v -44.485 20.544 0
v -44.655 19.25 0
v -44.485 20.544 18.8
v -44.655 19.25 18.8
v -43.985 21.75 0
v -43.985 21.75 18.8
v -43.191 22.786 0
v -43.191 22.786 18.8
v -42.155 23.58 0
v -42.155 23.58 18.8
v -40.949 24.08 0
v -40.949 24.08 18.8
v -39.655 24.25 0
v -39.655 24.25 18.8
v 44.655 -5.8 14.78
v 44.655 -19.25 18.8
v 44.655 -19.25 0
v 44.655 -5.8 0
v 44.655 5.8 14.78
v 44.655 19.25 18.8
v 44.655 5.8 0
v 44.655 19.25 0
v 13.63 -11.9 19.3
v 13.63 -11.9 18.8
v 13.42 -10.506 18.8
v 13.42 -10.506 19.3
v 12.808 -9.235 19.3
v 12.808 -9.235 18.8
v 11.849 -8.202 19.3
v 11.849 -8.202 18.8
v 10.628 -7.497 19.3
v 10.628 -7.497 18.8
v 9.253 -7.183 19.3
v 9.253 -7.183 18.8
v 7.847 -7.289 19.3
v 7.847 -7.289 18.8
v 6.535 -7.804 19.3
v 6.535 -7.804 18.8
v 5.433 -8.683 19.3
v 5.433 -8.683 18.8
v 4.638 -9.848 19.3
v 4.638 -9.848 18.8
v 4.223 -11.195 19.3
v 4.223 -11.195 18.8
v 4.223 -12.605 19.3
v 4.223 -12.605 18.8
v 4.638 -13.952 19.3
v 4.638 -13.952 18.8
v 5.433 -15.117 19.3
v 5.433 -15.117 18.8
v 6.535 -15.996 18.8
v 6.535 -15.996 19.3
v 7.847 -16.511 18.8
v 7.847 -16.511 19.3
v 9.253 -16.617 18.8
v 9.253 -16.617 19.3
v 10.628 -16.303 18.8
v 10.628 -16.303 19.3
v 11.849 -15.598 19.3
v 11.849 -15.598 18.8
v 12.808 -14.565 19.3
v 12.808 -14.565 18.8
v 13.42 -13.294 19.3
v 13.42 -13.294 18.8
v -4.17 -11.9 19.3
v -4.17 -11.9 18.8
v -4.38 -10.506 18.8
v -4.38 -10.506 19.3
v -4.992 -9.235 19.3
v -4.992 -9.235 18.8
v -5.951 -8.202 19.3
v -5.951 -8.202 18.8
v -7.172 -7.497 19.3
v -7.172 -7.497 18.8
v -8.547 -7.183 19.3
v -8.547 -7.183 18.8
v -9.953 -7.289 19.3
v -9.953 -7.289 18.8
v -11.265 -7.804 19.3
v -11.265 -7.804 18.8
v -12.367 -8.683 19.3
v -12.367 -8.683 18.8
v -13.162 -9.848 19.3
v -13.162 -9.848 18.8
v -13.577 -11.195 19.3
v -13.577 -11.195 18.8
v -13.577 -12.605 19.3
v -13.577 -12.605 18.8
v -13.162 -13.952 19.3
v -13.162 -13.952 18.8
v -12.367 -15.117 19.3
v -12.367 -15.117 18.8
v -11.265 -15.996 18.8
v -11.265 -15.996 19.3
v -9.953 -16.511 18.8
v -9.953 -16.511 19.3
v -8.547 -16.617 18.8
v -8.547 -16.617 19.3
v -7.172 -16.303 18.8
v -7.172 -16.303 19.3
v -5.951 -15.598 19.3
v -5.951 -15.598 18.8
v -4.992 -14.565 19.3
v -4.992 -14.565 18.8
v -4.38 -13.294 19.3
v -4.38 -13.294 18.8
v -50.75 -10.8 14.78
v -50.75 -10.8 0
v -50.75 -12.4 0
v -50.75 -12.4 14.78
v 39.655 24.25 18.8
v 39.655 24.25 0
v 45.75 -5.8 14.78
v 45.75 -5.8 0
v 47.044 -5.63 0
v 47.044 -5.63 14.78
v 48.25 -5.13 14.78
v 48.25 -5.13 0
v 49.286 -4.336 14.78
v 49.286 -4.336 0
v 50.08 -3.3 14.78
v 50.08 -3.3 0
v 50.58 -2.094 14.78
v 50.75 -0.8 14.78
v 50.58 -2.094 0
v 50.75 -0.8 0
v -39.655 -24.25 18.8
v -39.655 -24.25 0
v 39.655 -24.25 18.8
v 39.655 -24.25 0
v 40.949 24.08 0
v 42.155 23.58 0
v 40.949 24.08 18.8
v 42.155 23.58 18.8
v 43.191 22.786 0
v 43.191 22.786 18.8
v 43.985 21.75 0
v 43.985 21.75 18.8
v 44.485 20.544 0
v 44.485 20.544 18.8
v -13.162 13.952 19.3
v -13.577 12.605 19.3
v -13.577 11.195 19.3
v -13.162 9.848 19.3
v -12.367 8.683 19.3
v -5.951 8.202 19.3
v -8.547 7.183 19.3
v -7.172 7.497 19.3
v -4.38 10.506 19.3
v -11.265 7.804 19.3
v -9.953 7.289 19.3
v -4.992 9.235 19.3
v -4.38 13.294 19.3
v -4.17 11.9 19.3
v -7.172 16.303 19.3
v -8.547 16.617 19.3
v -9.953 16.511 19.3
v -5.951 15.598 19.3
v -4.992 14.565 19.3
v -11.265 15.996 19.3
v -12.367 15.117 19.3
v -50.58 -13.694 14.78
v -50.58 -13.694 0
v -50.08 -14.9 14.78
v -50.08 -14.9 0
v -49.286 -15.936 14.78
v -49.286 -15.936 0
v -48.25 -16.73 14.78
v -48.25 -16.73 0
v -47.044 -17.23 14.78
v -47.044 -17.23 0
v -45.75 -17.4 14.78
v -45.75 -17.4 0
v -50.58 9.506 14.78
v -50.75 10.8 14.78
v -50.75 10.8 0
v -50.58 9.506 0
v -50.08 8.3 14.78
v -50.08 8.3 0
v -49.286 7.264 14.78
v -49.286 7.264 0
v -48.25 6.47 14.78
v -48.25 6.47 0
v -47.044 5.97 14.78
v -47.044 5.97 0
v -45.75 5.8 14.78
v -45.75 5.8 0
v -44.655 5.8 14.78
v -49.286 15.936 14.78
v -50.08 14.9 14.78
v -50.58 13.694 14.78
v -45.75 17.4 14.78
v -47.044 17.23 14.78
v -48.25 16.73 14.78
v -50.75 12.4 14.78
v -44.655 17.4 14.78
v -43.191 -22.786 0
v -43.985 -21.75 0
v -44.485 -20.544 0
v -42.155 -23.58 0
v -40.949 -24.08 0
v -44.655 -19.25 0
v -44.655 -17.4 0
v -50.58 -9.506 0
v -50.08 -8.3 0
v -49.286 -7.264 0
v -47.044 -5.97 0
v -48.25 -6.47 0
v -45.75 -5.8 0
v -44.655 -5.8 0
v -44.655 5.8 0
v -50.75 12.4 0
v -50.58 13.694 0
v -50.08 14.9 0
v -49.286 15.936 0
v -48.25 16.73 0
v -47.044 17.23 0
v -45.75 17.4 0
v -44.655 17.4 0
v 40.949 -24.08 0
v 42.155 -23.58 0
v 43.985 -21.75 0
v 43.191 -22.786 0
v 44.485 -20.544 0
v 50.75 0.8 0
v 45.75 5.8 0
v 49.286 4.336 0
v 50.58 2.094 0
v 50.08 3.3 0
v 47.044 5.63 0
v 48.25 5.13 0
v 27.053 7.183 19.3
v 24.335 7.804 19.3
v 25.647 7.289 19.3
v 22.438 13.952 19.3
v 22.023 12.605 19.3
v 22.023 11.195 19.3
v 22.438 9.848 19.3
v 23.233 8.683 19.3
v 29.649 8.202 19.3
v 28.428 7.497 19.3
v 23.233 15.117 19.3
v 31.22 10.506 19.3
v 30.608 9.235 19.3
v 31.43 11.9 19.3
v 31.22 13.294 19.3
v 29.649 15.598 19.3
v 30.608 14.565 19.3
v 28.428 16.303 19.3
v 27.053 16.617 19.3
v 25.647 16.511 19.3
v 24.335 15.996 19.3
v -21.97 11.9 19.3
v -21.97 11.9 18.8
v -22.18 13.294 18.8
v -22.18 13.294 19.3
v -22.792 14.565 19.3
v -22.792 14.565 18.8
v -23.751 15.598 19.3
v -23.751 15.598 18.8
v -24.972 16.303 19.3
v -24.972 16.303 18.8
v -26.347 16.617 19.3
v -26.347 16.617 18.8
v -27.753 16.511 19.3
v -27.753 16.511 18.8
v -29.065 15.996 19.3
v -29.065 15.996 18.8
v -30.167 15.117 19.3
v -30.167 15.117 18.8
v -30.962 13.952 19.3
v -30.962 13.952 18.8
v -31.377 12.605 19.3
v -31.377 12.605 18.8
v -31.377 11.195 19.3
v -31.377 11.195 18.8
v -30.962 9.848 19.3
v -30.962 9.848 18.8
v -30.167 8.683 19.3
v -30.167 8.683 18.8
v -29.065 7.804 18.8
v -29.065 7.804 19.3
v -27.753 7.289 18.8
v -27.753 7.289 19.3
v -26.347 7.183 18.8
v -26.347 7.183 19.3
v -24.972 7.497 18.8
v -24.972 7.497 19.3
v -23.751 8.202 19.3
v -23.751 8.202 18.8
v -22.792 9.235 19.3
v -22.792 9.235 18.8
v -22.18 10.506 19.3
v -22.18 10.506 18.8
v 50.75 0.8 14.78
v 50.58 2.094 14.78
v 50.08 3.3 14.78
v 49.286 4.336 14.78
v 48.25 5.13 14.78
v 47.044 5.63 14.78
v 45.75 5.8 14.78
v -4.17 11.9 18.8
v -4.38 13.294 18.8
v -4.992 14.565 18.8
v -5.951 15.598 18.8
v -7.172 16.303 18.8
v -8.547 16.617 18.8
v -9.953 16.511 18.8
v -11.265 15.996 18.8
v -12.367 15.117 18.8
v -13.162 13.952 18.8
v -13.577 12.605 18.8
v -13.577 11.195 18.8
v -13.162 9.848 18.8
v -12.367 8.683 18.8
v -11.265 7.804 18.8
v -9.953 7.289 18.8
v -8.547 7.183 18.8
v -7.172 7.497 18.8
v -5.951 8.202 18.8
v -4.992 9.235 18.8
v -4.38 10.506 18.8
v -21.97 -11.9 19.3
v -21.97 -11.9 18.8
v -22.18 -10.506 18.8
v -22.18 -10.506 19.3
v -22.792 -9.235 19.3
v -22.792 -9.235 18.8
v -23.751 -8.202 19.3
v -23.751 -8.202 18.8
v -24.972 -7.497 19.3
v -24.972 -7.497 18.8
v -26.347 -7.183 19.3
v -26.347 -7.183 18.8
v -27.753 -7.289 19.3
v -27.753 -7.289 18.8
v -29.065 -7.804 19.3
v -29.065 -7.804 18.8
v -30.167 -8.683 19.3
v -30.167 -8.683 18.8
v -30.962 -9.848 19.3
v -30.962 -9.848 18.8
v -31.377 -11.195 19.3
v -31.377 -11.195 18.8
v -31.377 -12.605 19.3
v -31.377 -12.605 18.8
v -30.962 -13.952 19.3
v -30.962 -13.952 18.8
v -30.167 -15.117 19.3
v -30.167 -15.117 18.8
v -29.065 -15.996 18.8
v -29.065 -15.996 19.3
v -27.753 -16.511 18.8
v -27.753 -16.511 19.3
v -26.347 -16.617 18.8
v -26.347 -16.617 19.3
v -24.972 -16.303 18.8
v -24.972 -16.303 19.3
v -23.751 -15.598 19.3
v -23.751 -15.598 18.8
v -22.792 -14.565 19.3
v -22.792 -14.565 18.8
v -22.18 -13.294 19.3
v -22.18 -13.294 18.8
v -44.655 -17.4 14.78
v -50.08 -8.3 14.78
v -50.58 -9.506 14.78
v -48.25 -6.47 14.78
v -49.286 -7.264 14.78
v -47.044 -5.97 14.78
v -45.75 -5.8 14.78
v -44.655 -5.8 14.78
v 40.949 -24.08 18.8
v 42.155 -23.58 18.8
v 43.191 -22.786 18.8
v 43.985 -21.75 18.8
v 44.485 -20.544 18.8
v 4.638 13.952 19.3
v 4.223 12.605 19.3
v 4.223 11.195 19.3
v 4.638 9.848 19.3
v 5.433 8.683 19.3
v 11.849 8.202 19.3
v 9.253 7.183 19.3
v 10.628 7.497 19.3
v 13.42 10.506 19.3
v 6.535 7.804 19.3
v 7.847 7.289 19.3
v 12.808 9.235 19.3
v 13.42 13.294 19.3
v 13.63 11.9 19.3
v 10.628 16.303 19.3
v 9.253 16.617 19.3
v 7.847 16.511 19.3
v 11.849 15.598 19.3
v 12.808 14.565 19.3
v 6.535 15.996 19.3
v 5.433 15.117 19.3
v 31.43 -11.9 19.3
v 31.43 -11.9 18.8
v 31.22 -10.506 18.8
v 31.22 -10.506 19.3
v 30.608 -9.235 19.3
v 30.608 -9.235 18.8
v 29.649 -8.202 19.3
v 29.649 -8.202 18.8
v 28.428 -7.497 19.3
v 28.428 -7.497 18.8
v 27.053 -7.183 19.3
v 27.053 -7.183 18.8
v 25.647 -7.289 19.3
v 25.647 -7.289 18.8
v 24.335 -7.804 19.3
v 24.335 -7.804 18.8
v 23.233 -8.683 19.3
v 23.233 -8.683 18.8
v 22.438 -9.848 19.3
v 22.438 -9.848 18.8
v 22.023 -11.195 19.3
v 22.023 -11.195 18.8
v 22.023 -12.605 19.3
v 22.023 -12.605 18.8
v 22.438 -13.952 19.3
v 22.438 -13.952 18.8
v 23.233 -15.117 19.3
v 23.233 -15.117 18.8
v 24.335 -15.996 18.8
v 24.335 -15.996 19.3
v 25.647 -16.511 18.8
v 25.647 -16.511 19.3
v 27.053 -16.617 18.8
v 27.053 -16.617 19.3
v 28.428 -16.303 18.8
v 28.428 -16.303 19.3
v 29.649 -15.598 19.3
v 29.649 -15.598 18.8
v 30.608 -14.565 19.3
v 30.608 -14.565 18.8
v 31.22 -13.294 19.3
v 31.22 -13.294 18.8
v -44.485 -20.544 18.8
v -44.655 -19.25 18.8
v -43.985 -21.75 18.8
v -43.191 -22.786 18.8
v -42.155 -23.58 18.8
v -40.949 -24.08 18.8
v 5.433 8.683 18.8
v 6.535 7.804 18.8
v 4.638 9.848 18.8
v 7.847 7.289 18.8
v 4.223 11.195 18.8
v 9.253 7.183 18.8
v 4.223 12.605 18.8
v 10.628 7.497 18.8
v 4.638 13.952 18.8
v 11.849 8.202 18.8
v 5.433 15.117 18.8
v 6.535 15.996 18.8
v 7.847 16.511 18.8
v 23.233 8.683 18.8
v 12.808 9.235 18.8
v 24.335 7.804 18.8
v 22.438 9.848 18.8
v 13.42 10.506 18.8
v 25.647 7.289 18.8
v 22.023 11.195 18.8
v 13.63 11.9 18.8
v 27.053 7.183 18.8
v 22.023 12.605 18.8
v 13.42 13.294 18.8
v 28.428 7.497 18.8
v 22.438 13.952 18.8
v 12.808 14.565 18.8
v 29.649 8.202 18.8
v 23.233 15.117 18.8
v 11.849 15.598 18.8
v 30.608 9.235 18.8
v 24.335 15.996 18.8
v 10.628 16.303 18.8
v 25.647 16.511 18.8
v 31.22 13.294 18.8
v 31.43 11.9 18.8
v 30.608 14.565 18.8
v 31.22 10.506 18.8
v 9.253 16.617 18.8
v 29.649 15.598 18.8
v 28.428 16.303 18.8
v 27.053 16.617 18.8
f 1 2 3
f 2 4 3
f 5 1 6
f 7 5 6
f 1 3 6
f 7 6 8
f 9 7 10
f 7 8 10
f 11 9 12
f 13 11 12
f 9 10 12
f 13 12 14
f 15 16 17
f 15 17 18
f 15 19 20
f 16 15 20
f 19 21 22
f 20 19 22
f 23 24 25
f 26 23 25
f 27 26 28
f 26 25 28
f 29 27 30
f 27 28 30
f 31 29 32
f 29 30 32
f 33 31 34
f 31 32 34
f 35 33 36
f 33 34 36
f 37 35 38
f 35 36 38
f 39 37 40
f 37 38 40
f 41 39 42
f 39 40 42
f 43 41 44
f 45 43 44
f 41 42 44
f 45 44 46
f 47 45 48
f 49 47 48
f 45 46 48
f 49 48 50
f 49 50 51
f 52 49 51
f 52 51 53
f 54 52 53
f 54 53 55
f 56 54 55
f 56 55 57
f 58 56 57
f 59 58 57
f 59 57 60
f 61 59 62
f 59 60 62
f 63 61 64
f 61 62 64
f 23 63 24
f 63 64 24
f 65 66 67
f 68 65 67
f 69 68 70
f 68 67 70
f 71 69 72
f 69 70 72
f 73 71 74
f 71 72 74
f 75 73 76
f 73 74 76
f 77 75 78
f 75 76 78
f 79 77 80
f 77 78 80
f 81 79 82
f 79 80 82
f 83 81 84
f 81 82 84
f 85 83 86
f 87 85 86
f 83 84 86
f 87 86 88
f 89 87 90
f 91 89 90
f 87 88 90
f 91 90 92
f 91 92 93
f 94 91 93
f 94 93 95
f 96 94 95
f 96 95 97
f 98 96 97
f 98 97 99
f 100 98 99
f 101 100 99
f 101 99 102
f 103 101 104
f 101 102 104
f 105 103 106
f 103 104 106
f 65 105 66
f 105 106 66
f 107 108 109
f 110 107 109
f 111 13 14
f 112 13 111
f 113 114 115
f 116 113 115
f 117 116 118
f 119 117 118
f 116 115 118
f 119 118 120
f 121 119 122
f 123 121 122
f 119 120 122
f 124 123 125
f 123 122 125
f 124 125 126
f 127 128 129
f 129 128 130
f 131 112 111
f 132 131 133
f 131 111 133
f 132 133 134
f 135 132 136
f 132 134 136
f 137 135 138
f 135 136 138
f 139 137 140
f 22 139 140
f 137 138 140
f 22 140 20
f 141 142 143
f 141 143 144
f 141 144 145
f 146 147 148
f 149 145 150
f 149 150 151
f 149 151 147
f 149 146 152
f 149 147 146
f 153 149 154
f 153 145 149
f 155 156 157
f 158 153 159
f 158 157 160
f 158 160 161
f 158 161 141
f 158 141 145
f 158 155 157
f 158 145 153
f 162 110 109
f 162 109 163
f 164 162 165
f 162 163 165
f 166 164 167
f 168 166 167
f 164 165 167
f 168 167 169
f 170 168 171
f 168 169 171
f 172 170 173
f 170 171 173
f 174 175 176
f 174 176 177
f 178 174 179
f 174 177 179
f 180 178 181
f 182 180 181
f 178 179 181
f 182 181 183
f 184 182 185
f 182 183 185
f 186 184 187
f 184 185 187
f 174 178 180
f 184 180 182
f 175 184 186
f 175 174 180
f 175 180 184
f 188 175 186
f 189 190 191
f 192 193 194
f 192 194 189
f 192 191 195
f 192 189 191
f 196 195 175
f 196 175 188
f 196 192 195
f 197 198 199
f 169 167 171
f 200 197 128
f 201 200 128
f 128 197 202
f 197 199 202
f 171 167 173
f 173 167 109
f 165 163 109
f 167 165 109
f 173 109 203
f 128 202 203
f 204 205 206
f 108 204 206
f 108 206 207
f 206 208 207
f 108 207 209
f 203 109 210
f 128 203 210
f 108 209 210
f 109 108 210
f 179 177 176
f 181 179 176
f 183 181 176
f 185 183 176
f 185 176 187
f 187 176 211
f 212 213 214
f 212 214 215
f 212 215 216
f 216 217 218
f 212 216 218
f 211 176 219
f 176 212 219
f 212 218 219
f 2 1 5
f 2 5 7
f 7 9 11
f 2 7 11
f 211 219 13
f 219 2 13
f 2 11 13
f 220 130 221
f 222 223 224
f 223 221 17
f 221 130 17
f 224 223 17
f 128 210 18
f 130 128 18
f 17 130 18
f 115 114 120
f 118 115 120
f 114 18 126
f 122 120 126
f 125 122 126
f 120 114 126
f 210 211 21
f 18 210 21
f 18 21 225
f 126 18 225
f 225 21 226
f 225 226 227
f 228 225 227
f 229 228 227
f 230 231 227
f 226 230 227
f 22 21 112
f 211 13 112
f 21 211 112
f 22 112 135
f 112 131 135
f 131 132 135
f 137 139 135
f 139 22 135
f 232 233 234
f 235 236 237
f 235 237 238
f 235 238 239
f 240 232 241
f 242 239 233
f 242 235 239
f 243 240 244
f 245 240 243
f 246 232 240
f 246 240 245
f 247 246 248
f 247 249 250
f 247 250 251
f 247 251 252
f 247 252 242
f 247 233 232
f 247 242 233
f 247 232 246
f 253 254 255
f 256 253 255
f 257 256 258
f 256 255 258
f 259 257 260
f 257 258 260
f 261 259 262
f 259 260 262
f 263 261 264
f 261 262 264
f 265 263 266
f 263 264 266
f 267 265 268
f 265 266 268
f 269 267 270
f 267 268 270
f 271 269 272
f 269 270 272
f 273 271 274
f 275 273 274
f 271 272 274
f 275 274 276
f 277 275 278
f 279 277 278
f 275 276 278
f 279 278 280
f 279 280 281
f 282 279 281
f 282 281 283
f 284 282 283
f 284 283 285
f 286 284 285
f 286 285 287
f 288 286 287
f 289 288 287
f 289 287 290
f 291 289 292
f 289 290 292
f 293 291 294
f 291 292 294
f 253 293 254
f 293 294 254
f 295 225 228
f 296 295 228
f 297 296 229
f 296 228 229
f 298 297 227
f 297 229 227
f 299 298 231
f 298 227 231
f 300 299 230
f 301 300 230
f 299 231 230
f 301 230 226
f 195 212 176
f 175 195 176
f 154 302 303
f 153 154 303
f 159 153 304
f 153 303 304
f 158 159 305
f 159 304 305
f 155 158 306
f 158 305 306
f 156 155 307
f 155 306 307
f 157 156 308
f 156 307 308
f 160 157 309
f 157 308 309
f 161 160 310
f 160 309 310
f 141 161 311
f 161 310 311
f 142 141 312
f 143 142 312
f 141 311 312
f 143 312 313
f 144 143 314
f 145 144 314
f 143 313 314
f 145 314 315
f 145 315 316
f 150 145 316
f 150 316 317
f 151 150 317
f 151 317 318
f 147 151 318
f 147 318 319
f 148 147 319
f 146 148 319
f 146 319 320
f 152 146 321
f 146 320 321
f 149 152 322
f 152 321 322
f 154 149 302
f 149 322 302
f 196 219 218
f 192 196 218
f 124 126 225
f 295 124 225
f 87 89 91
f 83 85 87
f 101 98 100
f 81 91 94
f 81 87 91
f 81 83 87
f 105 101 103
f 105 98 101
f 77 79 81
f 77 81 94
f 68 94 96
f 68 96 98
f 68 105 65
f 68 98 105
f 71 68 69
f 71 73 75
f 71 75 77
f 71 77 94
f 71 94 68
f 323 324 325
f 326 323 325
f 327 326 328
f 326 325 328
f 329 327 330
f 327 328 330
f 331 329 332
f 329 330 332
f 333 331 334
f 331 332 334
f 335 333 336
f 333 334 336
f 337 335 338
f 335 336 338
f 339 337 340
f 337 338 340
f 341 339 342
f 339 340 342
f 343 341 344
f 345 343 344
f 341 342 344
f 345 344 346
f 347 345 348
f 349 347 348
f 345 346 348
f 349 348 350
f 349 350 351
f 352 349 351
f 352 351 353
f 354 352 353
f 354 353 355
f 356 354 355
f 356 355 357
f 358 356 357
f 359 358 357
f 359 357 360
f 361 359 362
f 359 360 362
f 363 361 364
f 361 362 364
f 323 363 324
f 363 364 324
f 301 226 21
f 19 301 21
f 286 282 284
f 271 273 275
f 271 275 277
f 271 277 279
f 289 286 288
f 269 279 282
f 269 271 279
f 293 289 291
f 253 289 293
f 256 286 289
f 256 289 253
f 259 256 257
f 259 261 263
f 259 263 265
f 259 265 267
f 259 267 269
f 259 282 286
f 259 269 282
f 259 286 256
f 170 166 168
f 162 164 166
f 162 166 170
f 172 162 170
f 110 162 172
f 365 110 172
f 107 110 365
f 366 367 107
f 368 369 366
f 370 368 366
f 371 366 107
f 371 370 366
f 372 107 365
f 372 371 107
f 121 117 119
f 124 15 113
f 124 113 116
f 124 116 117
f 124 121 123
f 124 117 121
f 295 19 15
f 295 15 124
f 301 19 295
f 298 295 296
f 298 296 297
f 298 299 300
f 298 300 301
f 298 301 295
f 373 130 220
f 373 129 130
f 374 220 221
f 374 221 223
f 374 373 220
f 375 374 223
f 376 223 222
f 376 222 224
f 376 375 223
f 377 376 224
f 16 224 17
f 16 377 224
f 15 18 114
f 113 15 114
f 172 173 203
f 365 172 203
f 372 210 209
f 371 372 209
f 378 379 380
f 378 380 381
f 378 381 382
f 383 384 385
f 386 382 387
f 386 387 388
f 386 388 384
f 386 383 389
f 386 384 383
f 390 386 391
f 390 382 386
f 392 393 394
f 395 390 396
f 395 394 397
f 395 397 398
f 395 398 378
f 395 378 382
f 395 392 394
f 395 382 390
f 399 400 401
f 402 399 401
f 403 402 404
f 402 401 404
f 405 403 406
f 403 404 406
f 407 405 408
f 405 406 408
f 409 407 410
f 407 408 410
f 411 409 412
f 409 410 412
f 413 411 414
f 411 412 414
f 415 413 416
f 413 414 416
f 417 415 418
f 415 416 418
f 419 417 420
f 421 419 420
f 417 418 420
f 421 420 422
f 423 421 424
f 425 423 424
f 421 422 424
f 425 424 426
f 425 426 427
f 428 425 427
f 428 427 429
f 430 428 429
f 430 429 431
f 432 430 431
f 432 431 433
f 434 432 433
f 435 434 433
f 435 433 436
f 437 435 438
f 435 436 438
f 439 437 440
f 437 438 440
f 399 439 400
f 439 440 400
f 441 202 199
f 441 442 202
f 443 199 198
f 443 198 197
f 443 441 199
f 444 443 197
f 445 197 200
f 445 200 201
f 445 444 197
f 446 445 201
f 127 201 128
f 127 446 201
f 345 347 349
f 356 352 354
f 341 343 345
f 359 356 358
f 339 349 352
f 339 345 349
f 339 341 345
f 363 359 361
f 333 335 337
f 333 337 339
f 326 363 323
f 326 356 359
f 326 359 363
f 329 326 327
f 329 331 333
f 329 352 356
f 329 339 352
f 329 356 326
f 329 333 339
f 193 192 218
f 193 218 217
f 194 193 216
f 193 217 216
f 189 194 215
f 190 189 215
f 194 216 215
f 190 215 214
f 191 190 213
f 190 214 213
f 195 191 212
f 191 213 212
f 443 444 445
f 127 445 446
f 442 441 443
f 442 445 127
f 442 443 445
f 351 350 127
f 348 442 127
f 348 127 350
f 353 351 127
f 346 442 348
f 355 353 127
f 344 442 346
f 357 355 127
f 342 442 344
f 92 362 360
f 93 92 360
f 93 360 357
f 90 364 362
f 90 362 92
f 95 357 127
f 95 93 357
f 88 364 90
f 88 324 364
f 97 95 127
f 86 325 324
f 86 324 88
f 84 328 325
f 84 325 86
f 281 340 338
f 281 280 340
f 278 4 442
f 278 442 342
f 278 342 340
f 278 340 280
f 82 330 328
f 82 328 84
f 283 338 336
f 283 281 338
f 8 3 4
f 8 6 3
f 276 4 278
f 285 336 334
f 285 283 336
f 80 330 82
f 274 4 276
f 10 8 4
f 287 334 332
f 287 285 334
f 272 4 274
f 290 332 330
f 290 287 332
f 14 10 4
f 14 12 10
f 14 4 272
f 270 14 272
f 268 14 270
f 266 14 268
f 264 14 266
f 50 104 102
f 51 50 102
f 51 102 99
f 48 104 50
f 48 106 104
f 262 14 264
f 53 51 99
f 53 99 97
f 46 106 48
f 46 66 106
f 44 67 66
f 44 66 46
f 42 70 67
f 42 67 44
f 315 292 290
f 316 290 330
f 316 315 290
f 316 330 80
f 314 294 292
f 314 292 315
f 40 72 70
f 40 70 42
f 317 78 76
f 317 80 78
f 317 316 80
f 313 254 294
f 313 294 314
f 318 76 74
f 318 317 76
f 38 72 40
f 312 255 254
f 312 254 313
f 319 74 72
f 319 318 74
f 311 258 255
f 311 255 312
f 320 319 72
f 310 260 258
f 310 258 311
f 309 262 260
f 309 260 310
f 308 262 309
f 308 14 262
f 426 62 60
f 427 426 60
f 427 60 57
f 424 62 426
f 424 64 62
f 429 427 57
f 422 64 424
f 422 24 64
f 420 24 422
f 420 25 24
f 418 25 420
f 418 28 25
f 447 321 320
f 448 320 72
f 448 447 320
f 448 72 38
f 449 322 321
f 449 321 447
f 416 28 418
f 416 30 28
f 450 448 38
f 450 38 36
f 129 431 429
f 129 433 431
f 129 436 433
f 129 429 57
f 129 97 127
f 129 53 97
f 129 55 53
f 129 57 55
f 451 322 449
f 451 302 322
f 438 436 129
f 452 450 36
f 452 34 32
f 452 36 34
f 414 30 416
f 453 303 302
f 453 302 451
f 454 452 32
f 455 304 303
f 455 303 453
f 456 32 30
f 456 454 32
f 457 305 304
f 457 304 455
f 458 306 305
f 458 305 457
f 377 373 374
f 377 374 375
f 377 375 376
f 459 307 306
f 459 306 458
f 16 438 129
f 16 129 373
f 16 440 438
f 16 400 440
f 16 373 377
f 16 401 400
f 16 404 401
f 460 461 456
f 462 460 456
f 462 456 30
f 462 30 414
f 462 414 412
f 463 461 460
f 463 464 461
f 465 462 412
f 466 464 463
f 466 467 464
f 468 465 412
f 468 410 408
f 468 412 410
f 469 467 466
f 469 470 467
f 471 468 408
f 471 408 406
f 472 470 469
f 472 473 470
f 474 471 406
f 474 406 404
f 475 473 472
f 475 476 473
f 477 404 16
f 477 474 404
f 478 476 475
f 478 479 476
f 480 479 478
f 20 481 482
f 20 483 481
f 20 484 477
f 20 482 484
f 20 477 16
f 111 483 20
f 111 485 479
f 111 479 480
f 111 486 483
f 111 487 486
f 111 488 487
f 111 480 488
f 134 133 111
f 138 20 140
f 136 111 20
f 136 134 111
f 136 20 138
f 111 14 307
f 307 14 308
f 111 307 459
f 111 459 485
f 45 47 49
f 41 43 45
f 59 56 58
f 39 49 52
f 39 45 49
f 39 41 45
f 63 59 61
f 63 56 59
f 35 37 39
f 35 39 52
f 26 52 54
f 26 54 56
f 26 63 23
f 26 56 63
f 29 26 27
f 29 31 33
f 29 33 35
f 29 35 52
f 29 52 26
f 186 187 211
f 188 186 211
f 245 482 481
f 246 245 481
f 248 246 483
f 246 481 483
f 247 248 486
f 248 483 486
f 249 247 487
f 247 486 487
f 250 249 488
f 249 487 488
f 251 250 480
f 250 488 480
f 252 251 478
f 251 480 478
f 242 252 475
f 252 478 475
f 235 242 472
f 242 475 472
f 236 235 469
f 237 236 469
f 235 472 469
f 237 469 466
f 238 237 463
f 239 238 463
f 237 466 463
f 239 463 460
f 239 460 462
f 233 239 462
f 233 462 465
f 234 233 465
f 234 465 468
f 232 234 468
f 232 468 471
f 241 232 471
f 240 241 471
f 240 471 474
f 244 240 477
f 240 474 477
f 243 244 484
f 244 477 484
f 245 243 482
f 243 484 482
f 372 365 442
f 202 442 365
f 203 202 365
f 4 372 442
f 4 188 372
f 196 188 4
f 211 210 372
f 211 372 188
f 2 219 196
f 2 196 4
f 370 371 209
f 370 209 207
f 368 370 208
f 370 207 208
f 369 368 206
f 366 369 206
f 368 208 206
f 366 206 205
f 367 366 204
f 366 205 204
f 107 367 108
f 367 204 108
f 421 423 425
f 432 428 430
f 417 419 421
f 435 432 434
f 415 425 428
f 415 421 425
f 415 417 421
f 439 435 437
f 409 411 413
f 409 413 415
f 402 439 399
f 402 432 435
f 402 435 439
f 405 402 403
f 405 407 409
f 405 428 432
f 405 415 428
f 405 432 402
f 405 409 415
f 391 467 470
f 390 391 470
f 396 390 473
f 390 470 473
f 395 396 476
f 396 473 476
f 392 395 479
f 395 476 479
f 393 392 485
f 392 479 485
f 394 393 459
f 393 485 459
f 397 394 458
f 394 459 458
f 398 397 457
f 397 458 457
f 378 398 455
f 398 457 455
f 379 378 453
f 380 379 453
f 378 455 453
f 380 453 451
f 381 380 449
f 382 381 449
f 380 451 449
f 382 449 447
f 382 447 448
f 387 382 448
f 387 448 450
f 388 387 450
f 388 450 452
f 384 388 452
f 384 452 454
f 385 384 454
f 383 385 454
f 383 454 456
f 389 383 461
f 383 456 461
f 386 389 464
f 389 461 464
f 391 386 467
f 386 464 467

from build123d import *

# Parameters (mm, degrees)
F0_W     = 89.31
F0_H     = 48.5
F1_DEPTH = 18.8
F2_R     = 4.73
F3_DEPTH = 0.5
F4_R     = 5
F6_DEPTH = 14.78
F8_DEPTH = 14.78


with BuildPart() as f1:
    # F0 (on Top) → F1 (new body)
    with BuildSketch(Plane.XY):
        Rectangle(F0_W, F0_H)
    extrude(amount=F1_DEPTH)

    # F2 (on face) → F3 (join)
    with BuildSketch(Plane.XY.offset(18.8)):
        with Locations((-26.7, 11.9)):
            Circle(F2_R)
        with Locations((-26.7, -11.9)):
            Circle(F2_R)
        with Locations((-8.9, 11.9)):
            Circle(F2_R)
        with Locations((-8.9, -11.9)):
            Circle(F2_R)
        with Locations((8.9, 11.9)):
            Circle(F2_R)
        with Locations((8.9, -11.9)):
            Circle(F2_R)
        with Locations((26.7, 11.9)):
            Circle(F2_R)
        with Locations((26.7, -11.9)):
            Circle(F2_R)
    extrude(amount=F3_DEPTH)

    # F4
    f4_edges = [f1.edges().sort_by_distance(p)[0] for p in [
        (-44.655, 24.25, 9.4),
        (-44.655, -24.25, 9.4),
        (44.655, -24.25, 9.4),
        (44.655, 24.25, 9.4),
    ]]
    fillet(f4_edges, radius=F4_R)

    # F5 (on Top) → F6 (join)
    with BuildSketch(Plane.XY):
        with BuildLine():
            Line((45.75, 5.8), (44.655, 5.8))
            Line((44.655, 5.8), (44.655, -5.8))
            Line((44.655, -5.8), (45.75, -5.8))
            ThreePointArc((45.75, -5.8), (49.285534, -4.335534), (50.75, -0.8))
            Line((50.75, -0.8), (50.75, 0.8))
            ThreePointArc((50.75, 0.8), (49.285534, 4.335534), (45.75, 5.8))
        make_face()
    extrude(amount=F6_DEPTH)

    # F7 (on Top) → F8 (join)
    with BuildSketch(Plane.XY):
        with BuildLine():
            ThreePointArc((-50.75, 10.8), (-49.285534, 7.264466), (-45.75, 5.8))
            Line((-45.75, 5.8), (-44.655, 5.8))
            Line((-44.655, 5.8), (-44.655, 17.4))
            Line((-44.655, 17.4), (-45.75, 17.4))
            ThreePointArc((-45.75, 17.4), (-49.285534, 15.935534), (-50.75, 12.4))
            Line((-50.75, 12.4), (-50.75, 10.8))
        make_face()
        with BuildLine():
            Line((-45.75, -17.4), (-44.655, -17.4))
            Line((-44.655, -17.4), (-44.655, -5.8))
            Line((-44.655, -5.8), (-45.75, -5.8))
            ThreePointArc((-45.75, -5.8), (-49.285534, -7.264466), (-50.75, -10.8))
            Line((-50.75, -10.8), (-50.75, -12.4))
            ThreePointArc((-50.75, -12.4), (-49.285534, -15.935534), (-45.75, -17.4))
        make_face()
    extrude(amount=F8_DEPTH)


solid = f1.part
